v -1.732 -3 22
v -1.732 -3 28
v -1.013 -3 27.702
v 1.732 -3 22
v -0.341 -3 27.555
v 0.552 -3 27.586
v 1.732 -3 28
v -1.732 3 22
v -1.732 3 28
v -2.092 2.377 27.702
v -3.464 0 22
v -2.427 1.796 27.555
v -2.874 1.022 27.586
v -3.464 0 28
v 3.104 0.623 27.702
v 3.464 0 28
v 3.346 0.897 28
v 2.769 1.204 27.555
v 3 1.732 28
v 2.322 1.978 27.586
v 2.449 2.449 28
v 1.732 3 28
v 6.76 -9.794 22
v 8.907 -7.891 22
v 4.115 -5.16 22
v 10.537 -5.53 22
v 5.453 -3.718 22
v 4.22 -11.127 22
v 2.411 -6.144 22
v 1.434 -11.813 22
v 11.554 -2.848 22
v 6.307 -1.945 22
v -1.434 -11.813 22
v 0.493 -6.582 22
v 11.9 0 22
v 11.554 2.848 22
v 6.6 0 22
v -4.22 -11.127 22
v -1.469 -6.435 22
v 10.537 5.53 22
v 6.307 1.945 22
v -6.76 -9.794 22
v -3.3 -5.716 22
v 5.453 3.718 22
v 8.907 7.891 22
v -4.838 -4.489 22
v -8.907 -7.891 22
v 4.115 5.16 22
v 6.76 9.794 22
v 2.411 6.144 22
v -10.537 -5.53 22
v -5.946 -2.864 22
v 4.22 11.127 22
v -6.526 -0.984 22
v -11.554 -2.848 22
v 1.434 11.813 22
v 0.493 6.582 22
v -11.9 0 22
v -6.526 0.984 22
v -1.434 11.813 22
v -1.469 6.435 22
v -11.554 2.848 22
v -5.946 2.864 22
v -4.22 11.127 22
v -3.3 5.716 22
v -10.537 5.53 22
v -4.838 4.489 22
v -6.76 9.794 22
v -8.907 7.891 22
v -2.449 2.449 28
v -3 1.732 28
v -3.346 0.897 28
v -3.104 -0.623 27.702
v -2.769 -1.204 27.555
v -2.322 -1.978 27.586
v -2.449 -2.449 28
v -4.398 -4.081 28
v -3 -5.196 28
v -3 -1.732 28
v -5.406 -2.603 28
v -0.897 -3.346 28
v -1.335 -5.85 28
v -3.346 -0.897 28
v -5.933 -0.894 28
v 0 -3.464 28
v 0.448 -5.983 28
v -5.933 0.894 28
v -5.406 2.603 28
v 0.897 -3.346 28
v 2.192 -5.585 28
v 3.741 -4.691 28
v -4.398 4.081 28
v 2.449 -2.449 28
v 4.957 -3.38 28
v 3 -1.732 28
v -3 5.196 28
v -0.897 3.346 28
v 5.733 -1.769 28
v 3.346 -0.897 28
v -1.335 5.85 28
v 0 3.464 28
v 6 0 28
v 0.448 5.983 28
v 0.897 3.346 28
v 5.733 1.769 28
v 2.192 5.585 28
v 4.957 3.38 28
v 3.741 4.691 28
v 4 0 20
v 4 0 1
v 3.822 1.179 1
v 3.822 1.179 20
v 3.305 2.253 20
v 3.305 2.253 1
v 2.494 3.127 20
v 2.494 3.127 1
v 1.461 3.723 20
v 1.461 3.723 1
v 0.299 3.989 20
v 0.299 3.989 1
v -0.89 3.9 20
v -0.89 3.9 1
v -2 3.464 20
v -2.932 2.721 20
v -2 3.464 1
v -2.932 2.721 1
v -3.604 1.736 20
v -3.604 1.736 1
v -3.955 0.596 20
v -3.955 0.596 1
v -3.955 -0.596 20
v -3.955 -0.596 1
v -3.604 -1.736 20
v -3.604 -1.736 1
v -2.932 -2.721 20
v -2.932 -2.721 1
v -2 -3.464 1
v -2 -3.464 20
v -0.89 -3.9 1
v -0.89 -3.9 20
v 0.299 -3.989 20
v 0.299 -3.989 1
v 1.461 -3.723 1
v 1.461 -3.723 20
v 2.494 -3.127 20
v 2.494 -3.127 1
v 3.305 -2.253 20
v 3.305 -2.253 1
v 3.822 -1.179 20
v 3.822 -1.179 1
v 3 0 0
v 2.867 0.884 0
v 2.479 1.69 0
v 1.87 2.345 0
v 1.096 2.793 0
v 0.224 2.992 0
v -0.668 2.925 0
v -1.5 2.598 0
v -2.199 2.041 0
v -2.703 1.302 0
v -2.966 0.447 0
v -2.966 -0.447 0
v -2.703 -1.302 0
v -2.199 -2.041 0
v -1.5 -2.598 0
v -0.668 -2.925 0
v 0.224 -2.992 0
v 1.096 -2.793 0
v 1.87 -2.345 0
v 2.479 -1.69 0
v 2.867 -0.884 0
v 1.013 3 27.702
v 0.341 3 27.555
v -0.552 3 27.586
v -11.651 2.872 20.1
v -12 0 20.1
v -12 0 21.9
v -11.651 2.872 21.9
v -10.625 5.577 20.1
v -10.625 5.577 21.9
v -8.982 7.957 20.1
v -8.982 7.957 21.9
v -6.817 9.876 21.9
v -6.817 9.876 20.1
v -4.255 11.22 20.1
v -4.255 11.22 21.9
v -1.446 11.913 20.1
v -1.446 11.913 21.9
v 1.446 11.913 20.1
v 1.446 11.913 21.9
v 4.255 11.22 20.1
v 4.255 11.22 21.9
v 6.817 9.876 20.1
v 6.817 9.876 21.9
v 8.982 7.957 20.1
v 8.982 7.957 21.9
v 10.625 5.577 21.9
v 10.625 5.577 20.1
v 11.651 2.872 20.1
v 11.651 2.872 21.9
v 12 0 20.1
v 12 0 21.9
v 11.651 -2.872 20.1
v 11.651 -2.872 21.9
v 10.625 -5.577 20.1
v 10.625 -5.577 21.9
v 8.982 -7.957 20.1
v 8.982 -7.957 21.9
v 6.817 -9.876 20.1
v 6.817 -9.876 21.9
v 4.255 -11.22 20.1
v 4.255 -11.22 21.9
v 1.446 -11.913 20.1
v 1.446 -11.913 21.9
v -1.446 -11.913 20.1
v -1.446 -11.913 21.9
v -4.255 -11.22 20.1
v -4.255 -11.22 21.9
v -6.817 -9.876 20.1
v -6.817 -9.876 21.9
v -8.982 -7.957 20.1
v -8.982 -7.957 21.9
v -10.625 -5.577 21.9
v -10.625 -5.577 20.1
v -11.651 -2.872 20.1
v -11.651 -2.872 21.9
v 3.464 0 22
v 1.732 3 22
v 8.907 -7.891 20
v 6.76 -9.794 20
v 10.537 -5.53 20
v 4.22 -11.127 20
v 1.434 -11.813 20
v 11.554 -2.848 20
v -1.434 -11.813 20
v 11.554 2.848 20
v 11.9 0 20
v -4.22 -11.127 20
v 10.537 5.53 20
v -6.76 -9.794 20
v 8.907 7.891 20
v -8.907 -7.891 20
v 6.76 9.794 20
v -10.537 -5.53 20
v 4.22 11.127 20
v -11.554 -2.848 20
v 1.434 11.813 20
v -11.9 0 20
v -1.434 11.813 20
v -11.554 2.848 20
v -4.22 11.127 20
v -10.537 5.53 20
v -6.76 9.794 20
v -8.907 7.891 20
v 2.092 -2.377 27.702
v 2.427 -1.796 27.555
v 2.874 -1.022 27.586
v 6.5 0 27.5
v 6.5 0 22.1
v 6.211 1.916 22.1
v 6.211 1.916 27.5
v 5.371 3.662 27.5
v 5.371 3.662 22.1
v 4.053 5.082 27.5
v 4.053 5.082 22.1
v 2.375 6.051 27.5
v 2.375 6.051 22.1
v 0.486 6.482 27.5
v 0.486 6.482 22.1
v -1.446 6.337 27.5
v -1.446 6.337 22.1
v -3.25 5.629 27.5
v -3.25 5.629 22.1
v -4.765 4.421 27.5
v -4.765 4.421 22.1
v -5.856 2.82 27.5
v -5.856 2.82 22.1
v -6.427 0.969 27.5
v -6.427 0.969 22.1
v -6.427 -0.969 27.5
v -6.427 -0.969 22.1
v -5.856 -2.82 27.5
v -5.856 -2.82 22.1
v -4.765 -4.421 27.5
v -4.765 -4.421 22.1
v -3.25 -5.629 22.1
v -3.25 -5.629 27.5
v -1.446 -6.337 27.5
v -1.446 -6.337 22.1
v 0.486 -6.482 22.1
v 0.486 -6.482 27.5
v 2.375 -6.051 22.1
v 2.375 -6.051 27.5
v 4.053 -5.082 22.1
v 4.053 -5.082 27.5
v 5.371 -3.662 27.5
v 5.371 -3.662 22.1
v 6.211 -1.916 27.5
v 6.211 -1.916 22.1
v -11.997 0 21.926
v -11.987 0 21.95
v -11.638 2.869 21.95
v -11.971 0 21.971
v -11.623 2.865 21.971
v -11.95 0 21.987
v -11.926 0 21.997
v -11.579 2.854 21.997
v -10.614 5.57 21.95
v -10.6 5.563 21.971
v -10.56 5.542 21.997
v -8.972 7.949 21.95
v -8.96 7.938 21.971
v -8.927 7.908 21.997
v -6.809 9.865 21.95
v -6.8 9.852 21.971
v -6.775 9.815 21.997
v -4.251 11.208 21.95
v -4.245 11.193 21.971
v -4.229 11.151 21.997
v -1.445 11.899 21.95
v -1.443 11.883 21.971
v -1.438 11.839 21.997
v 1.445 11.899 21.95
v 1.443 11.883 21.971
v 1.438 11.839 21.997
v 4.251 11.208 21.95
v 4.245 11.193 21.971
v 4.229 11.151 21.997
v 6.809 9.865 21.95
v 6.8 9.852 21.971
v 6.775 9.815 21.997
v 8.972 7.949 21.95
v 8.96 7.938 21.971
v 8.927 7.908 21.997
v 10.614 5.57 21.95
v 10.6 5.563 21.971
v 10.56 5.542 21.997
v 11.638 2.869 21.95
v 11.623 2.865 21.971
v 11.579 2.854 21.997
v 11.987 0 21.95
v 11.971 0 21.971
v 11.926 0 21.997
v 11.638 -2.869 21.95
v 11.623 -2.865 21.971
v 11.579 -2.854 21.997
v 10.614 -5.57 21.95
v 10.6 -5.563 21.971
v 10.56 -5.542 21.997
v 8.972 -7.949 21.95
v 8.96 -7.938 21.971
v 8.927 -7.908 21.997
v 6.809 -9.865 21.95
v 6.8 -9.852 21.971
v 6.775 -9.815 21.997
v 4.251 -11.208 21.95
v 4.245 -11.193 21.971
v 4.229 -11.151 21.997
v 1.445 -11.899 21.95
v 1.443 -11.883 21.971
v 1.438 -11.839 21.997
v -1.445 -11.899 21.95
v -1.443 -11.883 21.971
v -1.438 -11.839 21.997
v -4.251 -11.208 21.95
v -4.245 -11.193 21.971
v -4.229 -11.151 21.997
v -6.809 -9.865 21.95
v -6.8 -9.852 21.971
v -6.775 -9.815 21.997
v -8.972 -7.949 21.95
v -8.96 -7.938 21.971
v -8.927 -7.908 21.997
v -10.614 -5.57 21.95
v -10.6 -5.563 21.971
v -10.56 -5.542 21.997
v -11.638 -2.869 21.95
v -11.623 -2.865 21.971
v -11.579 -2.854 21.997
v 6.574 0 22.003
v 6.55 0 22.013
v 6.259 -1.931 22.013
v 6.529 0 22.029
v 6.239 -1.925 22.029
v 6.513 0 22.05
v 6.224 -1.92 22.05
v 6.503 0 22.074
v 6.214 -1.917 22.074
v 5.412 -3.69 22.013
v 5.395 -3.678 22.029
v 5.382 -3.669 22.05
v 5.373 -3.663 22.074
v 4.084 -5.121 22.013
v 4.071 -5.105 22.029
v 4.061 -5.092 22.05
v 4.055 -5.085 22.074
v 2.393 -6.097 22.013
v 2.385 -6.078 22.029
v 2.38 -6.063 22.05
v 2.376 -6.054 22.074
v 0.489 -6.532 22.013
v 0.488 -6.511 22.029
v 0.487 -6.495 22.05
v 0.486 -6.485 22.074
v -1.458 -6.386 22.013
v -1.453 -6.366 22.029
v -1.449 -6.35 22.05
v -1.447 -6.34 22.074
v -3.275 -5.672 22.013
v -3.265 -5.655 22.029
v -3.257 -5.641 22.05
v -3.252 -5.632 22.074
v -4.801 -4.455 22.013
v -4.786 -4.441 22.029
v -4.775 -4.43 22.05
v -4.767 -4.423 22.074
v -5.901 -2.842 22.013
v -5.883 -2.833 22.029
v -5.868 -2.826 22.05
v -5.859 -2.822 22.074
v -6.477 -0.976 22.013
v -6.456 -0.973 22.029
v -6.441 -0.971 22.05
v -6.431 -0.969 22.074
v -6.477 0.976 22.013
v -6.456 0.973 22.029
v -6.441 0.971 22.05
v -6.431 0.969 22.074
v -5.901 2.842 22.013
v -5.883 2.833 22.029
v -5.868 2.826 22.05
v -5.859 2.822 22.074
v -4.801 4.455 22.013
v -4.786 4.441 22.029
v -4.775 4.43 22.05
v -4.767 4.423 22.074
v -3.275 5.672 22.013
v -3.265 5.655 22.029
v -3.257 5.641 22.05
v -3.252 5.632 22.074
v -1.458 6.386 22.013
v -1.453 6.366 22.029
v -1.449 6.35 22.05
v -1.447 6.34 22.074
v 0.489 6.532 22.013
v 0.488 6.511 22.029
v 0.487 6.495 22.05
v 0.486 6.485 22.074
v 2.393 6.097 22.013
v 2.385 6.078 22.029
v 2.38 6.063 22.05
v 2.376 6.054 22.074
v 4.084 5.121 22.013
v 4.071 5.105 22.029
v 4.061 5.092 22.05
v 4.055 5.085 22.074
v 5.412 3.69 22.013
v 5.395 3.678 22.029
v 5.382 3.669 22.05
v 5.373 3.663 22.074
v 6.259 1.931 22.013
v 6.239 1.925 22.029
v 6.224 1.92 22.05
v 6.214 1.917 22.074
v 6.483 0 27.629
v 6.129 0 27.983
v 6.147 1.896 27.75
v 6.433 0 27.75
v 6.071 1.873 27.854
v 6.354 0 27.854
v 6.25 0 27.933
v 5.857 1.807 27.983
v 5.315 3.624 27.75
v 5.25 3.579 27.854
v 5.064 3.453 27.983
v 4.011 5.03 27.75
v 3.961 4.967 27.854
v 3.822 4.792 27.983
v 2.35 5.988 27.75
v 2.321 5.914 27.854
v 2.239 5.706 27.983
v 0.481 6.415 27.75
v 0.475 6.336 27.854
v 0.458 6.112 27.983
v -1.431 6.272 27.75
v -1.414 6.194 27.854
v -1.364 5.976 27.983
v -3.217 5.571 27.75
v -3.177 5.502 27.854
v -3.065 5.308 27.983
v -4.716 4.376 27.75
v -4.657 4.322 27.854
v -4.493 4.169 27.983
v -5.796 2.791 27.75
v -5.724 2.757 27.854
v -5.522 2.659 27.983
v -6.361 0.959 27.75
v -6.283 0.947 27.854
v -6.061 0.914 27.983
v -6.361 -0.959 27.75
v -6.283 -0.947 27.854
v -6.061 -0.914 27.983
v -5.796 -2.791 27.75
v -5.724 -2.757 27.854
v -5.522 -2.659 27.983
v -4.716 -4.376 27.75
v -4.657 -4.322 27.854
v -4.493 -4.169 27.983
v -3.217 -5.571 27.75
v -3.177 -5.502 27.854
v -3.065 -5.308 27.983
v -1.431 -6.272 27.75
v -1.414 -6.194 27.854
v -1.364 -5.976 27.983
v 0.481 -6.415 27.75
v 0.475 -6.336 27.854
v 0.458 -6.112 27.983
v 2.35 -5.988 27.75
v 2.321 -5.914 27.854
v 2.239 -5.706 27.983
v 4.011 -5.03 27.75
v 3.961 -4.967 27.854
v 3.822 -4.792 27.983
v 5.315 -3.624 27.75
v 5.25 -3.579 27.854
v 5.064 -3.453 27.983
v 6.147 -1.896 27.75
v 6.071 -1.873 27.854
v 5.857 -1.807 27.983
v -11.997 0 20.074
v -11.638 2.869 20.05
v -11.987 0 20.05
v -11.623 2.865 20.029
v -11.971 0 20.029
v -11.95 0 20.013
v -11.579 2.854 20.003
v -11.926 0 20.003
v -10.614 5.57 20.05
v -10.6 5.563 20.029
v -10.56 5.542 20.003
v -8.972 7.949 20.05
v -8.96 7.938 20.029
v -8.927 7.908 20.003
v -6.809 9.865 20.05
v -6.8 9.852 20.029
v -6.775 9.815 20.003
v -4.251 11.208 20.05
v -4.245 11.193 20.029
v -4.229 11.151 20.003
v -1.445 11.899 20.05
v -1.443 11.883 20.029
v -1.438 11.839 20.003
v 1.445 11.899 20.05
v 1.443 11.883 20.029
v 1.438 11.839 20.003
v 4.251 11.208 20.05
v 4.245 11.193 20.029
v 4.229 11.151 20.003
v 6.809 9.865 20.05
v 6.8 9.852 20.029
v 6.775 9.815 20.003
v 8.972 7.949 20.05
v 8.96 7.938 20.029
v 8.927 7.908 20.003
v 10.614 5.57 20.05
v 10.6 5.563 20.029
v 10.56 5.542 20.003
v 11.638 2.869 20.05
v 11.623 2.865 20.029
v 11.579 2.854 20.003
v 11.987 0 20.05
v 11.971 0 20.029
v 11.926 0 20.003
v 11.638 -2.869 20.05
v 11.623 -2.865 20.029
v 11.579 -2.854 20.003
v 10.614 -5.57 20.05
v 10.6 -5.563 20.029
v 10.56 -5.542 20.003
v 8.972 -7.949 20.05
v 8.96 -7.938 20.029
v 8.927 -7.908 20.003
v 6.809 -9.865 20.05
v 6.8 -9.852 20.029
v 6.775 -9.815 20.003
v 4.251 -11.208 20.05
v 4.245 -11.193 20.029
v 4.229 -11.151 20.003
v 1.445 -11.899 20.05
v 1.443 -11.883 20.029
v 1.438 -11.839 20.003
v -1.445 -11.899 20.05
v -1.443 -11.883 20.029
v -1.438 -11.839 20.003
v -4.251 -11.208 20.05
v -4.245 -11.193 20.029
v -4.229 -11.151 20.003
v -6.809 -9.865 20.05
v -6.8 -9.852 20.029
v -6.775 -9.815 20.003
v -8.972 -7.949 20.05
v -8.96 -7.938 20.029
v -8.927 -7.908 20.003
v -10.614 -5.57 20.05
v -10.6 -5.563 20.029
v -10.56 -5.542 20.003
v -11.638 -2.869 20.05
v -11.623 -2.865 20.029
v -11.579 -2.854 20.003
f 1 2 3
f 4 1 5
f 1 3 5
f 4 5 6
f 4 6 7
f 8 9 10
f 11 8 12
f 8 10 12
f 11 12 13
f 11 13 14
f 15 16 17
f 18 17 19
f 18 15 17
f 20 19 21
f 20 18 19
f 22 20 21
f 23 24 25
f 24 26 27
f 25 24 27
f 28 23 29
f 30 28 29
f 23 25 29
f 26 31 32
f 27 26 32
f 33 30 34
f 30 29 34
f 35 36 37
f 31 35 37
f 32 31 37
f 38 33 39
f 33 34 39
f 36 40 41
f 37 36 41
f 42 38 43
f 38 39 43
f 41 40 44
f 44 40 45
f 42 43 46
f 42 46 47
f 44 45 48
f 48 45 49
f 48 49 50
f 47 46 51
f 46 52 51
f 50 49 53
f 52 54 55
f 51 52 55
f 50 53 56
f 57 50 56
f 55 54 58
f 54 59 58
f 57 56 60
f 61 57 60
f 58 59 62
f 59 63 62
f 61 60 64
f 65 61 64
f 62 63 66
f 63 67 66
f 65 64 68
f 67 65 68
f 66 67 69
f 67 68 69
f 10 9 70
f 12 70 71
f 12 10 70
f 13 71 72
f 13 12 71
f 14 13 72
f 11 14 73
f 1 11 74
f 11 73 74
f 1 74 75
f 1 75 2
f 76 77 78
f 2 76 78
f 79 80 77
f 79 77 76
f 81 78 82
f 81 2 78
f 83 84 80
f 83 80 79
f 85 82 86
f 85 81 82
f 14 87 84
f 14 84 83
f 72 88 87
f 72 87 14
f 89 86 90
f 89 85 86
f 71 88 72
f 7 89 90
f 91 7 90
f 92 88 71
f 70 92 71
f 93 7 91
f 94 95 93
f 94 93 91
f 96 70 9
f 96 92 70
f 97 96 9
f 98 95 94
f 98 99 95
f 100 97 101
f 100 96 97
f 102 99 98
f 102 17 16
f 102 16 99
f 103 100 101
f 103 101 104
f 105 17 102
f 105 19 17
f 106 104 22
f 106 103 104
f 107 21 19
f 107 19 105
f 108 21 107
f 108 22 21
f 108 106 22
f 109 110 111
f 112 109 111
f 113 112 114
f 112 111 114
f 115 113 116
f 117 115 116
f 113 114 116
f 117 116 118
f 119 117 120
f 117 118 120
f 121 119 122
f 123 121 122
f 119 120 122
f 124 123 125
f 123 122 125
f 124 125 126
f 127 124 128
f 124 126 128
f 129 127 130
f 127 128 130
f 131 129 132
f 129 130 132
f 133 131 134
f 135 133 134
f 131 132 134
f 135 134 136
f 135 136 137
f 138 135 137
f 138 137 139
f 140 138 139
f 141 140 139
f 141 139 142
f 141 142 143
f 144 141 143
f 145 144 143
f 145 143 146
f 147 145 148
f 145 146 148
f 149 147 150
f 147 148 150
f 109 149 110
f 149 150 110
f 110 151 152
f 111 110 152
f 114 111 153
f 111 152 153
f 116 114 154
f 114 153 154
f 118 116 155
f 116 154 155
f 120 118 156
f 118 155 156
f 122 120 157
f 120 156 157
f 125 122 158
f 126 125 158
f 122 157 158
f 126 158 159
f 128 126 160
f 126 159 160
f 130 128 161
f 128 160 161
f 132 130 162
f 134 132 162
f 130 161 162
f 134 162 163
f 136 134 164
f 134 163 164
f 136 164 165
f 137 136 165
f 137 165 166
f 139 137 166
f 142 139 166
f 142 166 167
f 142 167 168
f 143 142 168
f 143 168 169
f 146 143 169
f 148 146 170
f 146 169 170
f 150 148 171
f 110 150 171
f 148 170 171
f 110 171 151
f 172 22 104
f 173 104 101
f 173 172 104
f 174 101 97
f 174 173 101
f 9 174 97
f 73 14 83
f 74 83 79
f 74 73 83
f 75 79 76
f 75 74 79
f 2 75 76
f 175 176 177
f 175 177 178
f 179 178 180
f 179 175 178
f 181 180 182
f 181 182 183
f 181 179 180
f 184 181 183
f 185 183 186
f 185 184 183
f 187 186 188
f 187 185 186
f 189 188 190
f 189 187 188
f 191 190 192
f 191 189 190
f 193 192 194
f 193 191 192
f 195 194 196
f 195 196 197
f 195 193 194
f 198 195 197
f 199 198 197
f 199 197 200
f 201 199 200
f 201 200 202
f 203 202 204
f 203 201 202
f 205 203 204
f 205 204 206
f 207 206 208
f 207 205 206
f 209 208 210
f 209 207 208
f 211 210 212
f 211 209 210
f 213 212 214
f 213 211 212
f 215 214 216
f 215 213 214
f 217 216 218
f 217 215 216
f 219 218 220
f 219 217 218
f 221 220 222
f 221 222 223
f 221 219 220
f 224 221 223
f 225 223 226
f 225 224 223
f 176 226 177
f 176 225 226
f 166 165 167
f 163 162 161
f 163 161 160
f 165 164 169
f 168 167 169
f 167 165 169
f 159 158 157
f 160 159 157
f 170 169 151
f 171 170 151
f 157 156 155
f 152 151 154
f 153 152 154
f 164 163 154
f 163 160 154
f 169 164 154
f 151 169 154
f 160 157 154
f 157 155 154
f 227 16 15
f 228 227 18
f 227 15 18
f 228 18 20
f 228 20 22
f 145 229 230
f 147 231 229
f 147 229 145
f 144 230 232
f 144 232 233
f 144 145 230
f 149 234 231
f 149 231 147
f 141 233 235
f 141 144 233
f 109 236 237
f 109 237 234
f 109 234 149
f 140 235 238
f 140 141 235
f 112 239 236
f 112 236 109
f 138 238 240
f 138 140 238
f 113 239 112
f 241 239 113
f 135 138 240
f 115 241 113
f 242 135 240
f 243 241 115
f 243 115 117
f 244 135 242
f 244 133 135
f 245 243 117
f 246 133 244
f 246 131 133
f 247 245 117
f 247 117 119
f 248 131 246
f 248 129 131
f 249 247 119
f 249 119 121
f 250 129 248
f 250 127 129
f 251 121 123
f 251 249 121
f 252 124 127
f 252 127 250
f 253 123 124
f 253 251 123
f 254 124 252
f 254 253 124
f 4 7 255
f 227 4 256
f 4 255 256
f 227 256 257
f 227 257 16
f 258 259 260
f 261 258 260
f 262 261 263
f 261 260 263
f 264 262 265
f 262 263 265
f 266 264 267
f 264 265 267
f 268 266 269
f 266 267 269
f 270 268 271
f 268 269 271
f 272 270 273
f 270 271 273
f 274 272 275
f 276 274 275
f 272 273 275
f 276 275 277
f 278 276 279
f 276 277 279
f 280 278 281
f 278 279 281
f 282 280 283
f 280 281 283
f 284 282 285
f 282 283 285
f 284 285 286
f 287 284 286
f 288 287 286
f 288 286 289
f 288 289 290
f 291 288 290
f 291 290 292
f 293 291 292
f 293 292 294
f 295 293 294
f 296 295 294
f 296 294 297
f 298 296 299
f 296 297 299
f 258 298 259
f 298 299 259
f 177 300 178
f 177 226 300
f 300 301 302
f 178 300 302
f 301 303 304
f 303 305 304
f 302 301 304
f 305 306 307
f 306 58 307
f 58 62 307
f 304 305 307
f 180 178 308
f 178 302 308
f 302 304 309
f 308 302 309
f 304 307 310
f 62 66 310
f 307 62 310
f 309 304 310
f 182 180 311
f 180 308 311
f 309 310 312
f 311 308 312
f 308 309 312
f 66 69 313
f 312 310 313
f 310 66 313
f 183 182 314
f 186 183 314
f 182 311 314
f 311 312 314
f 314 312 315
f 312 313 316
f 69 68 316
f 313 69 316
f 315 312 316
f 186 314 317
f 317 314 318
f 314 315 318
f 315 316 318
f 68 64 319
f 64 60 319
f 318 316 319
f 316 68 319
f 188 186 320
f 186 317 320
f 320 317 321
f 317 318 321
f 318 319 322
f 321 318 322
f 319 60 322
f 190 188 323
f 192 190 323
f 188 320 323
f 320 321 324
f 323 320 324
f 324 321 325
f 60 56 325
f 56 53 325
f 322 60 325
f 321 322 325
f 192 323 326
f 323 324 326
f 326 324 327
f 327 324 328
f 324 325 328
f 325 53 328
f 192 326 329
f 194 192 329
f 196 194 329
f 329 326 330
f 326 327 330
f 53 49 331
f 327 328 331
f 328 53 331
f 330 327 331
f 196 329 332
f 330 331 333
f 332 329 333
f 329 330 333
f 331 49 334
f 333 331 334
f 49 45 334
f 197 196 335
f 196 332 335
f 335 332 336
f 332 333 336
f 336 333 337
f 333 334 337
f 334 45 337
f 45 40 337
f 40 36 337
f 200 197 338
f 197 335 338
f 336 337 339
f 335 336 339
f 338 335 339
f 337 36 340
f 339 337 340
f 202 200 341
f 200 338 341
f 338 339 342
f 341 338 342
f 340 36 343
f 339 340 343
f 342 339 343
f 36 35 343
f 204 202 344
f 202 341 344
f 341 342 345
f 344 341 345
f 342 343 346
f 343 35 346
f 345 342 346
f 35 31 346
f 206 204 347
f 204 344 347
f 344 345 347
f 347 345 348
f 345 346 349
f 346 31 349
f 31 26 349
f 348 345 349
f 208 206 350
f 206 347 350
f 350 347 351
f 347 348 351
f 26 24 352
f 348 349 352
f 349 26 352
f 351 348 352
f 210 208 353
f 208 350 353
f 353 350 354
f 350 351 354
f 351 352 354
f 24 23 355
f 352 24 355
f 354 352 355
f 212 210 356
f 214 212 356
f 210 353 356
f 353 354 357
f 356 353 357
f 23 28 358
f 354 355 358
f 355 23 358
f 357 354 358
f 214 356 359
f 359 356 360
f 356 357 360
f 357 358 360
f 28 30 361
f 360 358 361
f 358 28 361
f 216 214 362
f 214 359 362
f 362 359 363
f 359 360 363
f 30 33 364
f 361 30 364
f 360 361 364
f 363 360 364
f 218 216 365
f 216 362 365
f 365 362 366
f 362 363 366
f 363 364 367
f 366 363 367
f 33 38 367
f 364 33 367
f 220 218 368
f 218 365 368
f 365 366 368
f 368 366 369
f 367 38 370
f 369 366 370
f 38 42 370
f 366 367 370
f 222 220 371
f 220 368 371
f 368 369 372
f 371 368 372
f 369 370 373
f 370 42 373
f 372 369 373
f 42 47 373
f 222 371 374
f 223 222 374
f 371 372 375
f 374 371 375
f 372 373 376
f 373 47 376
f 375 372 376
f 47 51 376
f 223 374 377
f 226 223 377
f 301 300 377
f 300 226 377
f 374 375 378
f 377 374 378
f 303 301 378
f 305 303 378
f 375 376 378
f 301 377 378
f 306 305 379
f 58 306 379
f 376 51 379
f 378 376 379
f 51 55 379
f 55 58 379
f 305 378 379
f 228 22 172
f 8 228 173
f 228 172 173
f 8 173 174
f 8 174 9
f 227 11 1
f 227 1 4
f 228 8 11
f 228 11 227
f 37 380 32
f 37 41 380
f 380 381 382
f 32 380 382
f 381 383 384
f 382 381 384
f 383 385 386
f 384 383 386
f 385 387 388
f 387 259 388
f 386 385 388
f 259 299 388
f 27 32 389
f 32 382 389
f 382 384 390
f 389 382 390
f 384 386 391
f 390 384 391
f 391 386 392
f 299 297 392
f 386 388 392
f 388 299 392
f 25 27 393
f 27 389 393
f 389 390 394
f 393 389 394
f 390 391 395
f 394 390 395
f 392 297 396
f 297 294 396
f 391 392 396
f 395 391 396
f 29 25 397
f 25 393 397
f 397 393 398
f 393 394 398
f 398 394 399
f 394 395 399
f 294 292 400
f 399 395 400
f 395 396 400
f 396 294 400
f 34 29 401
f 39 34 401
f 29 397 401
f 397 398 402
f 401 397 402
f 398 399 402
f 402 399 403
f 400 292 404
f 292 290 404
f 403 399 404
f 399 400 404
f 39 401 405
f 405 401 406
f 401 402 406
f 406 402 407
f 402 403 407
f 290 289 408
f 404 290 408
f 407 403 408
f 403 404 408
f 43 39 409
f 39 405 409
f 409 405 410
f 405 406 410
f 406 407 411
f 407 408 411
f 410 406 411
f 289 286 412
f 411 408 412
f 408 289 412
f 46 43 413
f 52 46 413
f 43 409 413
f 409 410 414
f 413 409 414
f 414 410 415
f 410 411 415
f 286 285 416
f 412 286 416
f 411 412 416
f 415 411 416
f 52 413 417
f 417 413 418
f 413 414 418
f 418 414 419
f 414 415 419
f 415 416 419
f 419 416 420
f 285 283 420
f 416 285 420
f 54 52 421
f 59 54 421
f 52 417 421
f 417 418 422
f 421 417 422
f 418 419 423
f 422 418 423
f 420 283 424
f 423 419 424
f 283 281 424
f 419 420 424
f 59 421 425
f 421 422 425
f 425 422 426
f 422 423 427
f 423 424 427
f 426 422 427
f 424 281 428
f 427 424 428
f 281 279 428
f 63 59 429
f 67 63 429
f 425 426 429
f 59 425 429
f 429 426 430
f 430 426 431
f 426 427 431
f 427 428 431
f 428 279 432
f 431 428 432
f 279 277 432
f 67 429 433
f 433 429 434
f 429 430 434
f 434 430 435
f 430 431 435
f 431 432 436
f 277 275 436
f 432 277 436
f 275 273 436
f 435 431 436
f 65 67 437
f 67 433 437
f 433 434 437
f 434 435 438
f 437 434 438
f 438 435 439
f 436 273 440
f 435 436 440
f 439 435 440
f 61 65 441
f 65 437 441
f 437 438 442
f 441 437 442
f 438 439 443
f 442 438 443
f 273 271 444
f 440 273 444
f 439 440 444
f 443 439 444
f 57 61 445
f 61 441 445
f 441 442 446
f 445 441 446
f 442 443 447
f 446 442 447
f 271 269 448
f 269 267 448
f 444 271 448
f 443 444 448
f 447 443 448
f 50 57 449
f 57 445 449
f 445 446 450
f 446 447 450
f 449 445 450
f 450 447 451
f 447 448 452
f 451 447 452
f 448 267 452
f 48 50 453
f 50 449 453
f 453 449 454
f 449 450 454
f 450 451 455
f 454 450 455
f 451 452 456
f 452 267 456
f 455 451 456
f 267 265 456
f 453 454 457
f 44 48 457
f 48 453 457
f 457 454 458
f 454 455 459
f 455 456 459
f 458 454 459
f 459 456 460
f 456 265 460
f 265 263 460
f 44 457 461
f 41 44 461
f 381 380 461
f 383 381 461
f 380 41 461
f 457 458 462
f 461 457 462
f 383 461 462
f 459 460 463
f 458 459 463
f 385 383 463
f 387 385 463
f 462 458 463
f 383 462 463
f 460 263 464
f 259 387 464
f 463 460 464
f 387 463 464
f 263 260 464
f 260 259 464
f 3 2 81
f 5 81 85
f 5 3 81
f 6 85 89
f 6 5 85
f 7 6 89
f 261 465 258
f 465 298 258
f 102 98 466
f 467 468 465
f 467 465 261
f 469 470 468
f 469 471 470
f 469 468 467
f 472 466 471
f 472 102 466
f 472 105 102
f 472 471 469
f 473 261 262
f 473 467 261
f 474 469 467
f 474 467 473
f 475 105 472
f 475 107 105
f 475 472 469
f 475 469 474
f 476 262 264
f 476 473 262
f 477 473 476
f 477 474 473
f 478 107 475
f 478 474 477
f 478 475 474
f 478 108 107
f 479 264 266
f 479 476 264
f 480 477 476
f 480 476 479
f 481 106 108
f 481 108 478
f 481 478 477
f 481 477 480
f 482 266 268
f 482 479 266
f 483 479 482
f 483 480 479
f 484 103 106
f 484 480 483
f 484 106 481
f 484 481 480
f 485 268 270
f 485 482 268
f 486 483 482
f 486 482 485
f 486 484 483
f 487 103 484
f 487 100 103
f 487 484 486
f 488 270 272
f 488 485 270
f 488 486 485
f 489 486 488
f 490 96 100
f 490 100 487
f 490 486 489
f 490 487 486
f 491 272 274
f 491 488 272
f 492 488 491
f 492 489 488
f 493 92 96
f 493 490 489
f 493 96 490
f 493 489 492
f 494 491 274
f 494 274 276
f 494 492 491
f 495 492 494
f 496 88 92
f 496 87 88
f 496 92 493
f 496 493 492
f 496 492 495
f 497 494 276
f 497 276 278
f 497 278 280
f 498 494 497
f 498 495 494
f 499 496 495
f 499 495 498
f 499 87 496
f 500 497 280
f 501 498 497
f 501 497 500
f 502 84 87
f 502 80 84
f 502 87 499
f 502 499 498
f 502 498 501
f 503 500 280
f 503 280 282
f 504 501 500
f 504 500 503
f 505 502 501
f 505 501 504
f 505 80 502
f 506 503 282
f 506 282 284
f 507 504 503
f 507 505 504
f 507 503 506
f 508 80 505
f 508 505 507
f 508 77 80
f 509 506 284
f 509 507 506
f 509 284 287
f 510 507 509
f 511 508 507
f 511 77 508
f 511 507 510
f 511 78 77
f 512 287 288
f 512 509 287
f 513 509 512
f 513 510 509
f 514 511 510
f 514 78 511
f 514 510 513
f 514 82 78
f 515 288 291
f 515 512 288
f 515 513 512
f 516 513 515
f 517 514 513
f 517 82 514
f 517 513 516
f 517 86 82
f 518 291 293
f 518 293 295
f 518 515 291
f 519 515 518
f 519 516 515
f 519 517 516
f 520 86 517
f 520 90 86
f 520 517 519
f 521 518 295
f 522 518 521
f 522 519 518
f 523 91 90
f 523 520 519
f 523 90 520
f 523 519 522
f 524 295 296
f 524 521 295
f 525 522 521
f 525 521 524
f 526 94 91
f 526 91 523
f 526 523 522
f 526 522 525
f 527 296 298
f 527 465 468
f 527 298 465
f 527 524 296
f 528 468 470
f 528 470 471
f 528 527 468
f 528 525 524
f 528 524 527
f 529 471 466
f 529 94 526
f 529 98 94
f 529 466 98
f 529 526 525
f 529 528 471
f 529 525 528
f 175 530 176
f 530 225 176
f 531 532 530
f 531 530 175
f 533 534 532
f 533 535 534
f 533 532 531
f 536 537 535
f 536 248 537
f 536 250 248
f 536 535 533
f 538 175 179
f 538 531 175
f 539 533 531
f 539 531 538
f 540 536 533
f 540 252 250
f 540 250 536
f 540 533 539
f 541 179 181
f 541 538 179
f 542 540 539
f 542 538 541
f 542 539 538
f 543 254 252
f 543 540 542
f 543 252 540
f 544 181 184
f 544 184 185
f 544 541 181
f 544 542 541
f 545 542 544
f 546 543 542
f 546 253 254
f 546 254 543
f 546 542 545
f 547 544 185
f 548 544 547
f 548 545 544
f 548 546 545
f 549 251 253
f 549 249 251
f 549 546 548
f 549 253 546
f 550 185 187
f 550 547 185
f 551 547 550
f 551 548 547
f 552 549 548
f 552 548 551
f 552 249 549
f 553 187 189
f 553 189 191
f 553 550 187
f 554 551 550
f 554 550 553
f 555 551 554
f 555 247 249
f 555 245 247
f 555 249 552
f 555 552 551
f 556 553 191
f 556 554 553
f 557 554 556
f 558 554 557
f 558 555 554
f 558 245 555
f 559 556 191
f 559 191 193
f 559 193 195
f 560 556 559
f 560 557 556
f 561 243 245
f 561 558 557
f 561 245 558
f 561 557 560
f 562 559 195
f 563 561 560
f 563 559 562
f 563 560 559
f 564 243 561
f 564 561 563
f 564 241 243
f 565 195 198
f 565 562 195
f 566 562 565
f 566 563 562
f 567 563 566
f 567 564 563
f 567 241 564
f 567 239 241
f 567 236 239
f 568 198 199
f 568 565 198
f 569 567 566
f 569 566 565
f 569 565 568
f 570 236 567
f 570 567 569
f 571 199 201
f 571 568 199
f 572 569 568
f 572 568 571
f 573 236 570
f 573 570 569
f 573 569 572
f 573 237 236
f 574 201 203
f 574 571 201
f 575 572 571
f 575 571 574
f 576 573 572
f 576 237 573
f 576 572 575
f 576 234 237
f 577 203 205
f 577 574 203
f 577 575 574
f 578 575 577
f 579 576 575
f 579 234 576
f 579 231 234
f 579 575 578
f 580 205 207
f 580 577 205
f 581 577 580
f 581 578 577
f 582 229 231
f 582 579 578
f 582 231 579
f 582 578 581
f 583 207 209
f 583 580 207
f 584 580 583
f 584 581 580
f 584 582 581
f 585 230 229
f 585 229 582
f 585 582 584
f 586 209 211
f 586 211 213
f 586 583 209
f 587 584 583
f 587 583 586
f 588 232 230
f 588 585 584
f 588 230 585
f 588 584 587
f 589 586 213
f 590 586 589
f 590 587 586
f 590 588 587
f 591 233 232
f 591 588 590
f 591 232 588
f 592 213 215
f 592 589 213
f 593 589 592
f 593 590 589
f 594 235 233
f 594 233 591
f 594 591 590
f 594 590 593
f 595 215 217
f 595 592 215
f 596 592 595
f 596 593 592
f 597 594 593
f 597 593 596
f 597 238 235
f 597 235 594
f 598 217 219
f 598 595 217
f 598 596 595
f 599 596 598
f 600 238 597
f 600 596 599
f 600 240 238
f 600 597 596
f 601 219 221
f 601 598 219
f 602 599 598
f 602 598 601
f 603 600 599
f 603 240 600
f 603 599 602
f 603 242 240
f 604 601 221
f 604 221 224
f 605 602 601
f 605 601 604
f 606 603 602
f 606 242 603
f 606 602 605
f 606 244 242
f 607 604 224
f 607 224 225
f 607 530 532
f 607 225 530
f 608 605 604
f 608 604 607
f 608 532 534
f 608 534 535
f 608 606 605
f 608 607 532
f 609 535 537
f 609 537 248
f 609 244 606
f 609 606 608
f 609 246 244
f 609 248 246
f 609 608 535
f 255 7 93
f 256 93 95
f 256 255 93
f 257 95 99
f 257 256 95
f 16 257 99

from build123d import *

# Parameters (mm, degrees)
SCHIZZO1_R                   = 4
ESTRUSIONE_ESTRUSIONE1_DEPTH = 20
SMUSSO1_SIZE                 = 1
SCHIZZO6_R                   = 6.5
ESTRUSIONE_ESTRUSIONE3_DEPTH = 8
TAGLIO_ESTRUSIONE3_DEPTH     = 6
SCHIZZO8_R                   = 3.464101615
TAGLIO_ESTRUSIONE4_DEPTH     = 1
TAGLIO_ESTRUSIONE4_TAPER     = 45
RACCORDO1_R                  = 0.5
SCHIZZO9_R                   = 12
SCHIZZO9_R_2                 = 6.5
ESTRUSIONE_ESTRUSIONE4_DEPTH = 2
RACCORDO2_R                  = 0.1


with BuildPart() as part:
    # Schizzo1 → Estrusione-Estrusione1 (new body)
    with BuildSketch(Plane.XY):
        Circle(SCHIZZO1_R)
    extrude(amount=ESTRUSIONE_ESTRUSIONE1_DEPTH)

    # Smusso1
    smusso1_edges = [part.edges().sort_by_distance(p)[0] for p in [
        (-4, 0, 0),
    ]]
    chamfer(smusso1_edges, length=SMUSSO1_SIZE)

    # Schizzo6 → Estrusione-Estrusione3 (add)
    with BuildSketch(Plane.XY.offset(20)):
        Circle(SCHIZZO6_R)
    extrude(amount=ESTRUSIONE_ESTRUSIONE3_DEPTH)

    # Schizzo7 → Taglio-Estrusione3 (cut)
    with BuildSketch(Plane.XY.offset(28)):
        Polygon((1.732050808, 3), (-1.732050808, 3), (-3.464101615, 0), (-1.732050808, -3), (1.732050808, -3), (3.464101615, 0), align=None)
    extrude(amount=-TAGLIO_ESTRUSIONE3_DEPTH, mode=Mode.SUBTRACT)

    # Schizzo8 → Taglio-Estrusione4 (cut)
    with BuildSketch(Plane.XY.offset(28)):
        Circle(SCHIZZO8_R)
    extrude(amount=-TAGLIO_ESTRUSIONE4_DEPTH, taper=TAGLIO_ESTRUSIONE4_TAPER, mode=Mode.SUBTRACT)

    # Raccordo1
    raccordo1_edges = [part.edges().sort_by_distance(p)[0] for p in [
        (-6.5, 0, 28),
    ]]
    fillet(raccordo1_edges, radius=RACCORDO1_R)

    # Schizzo9 → Estrusione-Estrusione4 (add)
    with BuildSketch(Plane(origin=(0, 0, 20), x_dir=(-1, 0, 0), z_dir=(0, 0, -1))):
        Circle(SCHIZZO9_R)
        Circle(SCHIZZO9_R_2, mode=Mode.SUBTRACT)
    extrude(amount=-ESTRUSIONE_ESTRUSIONE4_DEPTH)

    # Raccordo2
    raccordo2_edges = [part.edges().sort_by_distance(p)[0] for p in [
        (-6.5, 0, 22),
        (12, 0, 22),
        (12, 0, 20),
    ]]
    fillet(raccordo2_edges, radius=RACCORDO2_R)


solid = part.part
